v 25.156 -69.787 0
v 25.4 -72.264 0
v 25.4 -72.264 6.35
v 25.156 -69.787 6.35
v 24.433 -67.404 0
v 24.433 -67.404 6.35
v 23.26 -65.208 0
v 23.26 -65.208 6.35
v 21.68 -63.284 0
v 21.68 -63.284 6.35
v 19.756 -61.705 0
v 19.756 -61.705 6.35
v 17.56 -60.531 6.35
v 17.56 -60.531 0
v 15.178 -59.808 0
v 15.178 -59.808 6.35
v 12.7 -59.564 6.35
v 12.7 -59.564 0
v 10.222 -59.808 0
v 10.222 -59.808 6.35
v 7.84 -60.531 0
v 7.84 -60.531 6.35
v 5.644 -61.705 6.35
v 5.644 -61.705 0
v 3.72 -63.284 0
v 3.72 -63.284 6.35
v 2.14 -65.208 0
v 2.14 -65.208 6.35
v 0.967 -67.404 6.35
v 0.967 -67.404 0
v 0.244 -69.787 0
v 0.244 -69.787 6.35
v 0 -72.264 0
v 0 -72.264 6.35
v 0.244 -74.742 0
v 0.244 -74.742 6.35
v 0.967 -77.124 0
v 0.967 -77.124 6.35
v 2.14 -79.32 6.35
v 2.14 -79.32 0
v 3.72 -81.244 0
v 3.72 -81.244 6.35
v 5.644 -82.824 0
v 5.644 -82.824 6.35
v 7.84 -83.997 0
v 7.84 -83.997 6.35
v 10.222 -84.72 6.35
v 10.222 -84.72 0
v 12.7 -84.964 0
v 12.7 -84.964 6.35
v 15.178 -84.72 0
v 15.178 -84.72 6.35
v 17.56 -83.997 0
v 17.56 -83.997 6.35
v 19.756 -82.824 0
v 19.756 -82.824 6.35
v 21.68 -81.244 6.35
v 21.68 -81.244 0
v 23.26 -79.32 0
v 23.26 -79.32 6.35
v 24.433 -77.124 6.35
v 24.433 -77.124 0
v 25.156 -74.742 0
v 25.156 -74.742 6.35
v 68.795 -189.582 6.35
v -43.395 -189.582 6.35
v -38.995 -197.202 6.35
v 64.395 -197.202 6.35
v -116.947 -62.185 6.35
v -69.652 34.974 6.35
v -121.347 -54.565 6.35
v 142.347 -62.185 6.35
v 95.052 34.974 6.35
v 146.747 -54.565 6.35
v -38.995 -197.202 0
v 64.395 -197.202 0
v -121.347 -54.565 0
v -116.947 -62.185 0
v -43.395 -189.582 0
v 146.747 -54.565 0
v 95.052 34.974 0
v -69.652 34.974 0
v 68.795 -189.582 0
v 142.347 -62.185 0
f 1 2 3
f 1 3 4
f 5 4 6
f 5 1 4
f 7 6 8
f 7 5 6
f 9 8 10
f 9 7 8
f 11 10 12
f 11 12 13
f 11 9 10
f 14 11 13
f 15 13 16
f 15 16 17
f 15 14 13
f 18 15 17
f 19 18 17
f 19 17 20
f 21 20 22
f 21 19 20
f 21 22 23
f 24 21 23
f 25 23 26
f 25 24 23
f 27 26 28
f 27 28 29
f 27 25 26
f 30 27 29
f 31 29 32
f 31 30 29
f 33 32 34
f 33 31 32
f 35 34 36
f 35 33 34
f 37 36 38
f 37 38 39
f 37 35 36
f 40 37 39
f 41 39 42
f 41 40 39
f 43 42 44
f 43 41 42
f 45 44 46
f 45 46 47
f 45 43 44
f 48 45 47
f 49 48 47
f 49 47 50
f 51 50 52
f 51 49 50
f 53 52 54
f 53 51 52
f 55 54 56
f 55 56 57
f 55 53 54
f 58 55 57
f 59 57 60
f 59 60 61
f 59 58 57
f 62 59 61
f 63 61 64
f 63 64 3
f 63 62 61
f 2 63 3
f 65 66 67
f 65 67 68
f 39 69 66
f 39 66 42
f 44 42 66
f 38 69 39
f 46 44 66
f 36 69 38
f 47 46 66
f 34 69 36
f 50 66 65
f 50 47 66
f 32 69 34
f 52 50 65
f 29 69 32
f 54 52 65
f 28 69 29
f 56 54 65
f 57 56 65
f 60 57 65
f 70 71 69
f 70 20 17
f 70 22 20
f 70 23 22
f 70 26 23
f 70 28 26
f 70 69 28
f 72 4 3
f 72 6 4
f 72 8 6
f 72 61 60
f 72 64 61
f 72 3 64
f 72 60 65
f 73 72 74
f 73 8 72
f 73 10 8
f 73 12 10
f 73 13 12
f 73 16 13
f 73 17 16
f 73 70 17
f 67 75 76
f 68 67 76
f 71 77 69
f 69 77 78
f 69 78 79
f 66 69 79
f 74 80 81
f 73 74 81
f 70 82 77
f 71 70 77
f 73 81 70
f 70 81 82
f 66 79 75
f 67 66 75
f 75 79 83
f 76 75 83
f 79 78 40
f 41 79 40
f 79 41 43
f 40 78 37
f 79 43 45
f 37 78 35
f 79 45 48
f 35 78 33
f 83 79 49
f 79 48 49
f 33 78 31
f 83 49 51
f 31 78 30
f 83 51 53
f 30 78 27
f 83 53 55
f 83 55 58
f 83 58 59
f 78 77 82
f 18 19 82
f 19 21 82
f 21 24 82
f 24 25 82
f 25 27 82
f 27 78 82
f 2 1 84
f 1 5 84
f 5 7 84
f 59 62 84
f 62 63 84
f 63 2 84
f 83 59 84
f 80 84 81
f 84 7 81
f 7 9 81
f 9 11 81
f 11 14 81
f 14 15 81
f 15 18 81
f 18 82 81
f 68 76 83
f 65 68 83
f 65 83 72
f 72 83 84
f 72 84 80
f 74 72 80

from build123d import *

# Parameters (mm, degrees)
F0_R     = 12.7
F1_DEPTH = 6.35


with BuildPart() as f1:
    # F0 (on Top) → F1 (new body)
    with BuildSketch(Plane.XY):
        Polygon((86.252718, 34.973921), (-60.852718, 34.973921), (-116.947282, -62.184713), (-43.394563, -189.581758), (68.794563, -189.581758), (142.347282, -62.184713), align=None)
        with Locations((12.7, -72.264184)):
            Circle(F0_R, mode=Mode.SUBTRACT)
        Polygon((-116.947282, -62.184713), (-60.852718, 34.973921), (-69.651536, 34.973921), (-121.346691, -54.564713), align=None)
        Polygon((95.051536, 34.973921), (86.252718, 34.973921), (142.347282, -62.184713), (146.746691, -54.564713), align=None)
        Polygon((68.794563, -189.581758), (-43.394563, -189.581758), (-38.995154, -197.201758), (64.395154, -197.201758), align=None)
    extrude(amount=F1_DEPTH)


solid = f1.part
